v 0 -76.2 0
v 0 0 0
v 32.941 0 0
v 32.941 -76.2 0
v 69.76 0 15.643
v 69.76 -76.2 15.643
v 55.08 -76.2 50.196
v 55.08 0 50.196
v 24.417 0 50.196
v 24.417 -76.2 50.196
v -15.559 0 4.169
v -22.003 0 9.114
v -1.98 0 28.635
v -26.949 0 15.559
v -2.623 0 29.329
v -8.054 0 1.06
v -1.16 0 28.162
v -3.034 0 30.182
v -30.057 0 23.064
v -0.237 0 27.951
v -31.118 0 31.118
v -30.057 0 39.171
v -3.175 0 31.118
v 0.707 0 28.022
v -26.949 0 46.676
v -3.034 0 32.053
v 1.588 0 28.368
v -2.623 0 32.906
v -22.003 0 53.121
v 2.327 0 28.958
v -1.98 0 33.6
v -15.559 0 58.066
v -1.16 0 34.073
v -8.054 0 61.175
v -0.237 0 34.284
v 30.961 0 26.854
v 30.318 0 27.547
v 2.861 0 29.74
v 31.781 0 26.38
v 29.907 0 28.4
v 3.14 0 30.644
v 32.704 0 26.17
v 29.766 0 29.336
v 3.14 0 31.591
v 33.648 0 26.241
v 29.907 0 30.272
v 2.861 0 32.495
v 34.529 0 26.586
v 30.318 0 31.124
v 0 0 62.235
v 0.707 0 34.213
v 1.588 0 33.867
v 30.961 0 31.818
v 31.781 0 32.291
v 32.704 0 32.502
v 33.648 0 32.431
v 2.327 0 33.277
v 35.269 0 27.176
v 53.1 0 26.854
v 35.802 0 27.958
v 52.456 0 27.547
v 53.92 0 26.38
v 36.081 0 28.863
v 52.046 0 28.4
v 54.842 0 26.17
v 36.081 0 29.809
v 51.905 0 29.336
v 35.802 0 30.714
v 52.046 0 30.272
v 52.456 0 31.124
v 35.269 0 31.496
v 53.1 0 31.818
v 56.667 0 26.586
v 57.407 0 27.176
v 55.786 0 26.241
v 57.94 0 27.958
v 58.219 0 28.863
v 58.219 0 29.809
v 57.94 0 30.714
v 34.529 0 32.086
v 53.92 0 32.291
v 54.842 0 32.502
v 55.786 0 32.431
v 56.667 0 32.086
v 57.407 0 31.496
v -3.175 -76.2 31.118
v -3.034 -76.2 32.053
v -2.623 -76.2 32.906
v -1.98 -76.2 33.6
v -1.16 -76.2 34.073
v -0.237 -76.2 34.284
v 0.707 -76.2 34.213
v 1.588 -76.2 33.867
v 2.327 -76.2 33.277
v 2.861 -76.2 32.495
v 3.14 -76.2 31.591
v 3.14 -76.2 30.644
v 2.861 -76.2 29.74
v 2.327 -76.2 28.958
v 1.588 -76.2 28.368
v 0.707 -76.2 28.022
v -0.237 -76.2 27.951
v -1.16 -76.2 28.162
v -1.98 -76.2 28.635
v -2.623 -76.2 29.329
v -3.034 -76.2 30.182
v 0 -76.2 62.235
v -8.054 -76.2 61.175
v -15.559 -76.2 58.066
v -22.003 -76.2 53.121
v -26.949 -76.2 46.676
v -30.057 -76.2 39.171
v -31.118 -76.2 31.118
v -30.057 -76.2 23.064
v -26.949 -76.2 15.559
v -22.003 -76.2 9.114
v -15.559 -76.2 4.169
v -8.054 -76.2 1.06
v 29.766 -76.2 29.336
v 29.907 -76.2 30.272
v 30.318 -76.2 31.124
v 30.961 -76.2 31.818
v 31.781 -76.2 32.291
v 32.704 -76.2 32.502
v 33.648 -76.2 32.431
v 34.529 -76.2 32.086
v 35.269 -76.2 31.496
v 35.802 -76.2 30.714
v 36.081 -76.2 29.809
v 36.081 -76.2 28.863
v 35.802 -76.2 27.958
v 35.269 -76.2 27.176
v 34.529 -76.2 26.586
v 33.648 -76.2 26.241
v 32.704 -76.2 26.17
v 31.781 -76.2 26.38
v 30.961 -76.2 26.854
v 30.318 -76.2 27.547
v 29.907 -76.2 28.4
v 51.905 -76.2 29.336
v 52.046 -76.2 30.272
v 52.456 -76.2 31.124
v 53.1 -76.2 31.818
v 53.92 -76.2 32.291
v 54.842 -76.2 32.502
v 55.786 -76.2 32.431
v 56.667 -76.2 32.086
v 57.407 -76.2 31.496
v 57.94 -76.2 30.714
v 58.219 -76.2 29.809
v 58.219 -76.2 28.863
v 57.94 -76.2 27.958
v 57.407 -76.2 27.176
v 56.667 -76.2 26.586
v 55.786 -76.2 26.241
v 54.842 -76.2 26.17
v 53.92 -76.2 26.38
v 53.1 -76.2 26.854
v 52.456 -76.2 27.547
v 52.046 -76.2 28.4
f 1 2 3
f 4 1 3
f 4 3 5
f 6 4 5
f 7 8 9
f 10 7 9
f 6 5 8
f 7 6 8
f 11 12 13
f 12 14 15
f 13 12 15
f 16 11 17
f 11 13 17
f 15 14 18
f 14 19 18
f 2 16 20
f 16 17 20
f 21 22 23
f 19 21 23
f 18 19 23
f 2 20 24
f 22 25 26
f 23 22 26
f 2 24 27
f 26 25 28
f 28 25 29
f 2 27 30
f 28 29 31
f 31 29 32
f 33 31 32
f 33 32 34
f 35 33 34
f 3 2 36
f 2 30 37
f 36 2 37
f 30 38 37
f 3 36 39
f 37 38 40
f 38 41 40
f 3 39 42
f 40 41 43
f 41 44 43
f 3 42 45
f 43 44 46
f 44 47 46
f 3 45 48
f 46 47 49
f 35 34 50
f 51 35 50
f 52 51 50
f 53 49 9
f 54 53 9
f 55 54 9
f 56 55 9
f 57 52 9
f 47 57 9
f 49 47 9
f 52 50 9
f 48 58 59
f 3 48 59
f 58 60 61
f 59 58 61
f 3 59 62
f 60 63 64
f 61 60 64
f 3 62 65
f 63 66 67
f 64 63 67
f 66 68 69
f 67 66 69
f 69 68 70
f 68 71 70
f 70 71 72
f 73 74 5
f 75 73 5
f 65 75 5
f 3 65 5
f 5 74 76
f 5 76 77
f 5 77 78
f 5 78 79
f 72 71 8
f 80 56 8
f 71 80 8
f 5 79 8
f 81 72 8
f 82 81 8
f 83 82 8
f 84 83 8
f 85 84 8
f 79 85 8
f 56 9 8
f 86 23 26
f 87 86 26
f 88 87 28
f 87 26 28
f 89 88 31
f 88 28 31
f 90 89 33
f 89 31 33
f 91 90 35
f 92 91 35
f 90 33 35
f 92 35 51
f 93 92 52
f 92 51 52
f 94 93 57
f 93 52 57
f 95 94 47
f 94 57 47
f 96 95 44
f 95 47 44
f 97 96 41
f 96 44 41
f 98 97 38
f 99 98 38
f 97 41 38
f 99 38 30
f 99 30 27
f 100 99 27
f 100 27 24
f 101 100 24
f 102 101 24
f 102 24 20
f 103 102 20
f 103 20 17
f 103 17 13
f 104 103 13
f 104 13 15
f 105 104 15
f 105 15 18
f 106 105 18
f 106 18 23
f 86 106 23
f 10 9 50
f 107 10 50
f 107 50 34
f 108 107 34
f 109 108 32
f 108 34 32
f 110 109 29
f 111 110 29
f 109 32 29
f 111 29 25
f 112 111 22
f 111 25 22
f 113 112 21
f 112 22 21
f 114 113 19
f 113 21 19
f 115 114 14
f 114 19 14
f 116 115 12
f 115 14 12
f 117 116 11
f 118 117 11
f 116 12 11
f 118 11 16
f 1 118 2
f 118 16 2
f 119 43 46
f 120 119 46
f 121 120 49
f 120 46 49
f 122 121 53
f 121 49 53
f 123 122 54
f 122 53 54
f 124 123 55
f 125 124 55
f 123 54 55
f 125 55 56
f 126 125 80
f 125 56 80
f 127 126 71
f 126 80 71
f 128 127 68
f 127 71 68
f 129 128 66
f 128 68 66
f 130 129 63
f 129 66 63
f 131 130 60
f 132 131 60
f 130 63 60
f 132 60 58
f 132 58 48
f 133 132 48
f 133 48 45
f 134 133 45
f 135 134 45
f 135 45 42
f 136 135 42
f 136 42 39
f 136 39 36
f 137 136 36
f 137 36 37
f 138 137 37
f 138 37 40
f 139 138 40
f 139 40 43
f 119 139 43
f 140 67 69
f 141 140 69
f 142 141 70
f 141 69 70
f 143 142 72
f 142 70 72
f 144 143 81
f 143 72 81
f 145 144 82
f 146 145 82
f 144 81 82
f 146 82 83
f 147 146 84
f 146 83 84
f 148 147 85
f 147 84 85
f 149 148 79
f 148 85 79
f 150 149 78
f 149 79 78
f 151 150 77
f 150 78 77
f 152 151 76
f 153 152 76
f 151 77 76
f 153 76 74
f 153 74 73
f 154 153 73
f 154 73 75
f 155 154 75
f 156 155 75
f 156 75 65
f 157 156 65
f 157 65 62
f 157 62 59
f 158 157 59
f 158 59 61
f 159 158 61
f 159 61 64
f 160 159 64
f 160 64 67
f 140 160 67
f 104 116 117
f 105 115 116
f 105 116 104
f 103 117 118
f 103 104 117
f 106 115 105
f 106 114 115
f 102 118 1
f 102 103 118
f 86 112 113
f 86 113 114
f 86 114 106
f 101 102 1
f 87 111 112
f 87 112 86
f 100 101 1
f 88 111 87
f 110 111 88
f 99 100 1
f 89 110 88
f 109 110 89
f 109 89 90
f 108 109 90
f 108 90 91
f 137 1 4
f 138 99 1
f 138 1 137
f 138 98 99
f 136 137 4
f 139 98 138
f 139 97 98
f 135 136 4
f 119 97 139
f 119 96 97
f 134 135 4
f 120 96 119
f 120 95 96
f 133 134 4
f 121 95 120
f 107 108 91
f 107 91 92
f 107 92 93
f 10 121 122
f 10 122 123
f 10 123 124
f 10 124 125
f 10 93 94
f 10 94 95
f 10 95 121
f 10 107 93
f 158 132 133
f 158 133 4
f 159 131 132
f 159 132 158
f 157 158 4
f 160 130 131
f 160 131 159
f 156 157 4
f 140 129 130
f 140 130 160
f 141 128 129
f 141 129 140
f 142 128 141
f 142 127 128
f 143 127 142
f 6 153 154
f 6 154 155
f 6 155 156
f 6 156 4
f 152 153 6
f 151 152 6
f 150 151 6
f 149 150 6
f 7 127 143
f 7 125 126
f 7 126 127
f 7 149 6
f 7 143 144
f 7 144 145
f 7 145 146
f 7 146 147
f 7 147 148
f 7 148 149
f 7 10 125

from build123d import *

# Parameters (mm, degrees)
F1_DEPTH = 76.2
F3_D     = 6.35


with BuildPart() as f1:
    # F0 (on Front) → F1 (new body)
    with BuildSketch(Plane.XZ):
        with BuildLine():
            Line((24.416897, 50.195754), (0, 62.235206))
            ThreePointArc((0, 62.235206), (-31.117603, 31.117603), (0, 0))
            Line((0, 0), (32.941068, 0))
            Line((32.941068, 0), (69.759652, 15.642613))
            Line((69.759652, 15.642613), (55.079527, 50.195754))
            Line((55.079527, 50.195754), (24.416897, 50.195754))
        make_face()
    extrude(amount=F1_DEPTH)

    # F3 (through all)
    with Locations(Plane.XZ.offset(76.2)):
        with Locations((32.941068, 29.335953), (55.079527, 29.335953), (0, 31.117603)):
            Hole(F3_D / 2)


solid = f1.part
